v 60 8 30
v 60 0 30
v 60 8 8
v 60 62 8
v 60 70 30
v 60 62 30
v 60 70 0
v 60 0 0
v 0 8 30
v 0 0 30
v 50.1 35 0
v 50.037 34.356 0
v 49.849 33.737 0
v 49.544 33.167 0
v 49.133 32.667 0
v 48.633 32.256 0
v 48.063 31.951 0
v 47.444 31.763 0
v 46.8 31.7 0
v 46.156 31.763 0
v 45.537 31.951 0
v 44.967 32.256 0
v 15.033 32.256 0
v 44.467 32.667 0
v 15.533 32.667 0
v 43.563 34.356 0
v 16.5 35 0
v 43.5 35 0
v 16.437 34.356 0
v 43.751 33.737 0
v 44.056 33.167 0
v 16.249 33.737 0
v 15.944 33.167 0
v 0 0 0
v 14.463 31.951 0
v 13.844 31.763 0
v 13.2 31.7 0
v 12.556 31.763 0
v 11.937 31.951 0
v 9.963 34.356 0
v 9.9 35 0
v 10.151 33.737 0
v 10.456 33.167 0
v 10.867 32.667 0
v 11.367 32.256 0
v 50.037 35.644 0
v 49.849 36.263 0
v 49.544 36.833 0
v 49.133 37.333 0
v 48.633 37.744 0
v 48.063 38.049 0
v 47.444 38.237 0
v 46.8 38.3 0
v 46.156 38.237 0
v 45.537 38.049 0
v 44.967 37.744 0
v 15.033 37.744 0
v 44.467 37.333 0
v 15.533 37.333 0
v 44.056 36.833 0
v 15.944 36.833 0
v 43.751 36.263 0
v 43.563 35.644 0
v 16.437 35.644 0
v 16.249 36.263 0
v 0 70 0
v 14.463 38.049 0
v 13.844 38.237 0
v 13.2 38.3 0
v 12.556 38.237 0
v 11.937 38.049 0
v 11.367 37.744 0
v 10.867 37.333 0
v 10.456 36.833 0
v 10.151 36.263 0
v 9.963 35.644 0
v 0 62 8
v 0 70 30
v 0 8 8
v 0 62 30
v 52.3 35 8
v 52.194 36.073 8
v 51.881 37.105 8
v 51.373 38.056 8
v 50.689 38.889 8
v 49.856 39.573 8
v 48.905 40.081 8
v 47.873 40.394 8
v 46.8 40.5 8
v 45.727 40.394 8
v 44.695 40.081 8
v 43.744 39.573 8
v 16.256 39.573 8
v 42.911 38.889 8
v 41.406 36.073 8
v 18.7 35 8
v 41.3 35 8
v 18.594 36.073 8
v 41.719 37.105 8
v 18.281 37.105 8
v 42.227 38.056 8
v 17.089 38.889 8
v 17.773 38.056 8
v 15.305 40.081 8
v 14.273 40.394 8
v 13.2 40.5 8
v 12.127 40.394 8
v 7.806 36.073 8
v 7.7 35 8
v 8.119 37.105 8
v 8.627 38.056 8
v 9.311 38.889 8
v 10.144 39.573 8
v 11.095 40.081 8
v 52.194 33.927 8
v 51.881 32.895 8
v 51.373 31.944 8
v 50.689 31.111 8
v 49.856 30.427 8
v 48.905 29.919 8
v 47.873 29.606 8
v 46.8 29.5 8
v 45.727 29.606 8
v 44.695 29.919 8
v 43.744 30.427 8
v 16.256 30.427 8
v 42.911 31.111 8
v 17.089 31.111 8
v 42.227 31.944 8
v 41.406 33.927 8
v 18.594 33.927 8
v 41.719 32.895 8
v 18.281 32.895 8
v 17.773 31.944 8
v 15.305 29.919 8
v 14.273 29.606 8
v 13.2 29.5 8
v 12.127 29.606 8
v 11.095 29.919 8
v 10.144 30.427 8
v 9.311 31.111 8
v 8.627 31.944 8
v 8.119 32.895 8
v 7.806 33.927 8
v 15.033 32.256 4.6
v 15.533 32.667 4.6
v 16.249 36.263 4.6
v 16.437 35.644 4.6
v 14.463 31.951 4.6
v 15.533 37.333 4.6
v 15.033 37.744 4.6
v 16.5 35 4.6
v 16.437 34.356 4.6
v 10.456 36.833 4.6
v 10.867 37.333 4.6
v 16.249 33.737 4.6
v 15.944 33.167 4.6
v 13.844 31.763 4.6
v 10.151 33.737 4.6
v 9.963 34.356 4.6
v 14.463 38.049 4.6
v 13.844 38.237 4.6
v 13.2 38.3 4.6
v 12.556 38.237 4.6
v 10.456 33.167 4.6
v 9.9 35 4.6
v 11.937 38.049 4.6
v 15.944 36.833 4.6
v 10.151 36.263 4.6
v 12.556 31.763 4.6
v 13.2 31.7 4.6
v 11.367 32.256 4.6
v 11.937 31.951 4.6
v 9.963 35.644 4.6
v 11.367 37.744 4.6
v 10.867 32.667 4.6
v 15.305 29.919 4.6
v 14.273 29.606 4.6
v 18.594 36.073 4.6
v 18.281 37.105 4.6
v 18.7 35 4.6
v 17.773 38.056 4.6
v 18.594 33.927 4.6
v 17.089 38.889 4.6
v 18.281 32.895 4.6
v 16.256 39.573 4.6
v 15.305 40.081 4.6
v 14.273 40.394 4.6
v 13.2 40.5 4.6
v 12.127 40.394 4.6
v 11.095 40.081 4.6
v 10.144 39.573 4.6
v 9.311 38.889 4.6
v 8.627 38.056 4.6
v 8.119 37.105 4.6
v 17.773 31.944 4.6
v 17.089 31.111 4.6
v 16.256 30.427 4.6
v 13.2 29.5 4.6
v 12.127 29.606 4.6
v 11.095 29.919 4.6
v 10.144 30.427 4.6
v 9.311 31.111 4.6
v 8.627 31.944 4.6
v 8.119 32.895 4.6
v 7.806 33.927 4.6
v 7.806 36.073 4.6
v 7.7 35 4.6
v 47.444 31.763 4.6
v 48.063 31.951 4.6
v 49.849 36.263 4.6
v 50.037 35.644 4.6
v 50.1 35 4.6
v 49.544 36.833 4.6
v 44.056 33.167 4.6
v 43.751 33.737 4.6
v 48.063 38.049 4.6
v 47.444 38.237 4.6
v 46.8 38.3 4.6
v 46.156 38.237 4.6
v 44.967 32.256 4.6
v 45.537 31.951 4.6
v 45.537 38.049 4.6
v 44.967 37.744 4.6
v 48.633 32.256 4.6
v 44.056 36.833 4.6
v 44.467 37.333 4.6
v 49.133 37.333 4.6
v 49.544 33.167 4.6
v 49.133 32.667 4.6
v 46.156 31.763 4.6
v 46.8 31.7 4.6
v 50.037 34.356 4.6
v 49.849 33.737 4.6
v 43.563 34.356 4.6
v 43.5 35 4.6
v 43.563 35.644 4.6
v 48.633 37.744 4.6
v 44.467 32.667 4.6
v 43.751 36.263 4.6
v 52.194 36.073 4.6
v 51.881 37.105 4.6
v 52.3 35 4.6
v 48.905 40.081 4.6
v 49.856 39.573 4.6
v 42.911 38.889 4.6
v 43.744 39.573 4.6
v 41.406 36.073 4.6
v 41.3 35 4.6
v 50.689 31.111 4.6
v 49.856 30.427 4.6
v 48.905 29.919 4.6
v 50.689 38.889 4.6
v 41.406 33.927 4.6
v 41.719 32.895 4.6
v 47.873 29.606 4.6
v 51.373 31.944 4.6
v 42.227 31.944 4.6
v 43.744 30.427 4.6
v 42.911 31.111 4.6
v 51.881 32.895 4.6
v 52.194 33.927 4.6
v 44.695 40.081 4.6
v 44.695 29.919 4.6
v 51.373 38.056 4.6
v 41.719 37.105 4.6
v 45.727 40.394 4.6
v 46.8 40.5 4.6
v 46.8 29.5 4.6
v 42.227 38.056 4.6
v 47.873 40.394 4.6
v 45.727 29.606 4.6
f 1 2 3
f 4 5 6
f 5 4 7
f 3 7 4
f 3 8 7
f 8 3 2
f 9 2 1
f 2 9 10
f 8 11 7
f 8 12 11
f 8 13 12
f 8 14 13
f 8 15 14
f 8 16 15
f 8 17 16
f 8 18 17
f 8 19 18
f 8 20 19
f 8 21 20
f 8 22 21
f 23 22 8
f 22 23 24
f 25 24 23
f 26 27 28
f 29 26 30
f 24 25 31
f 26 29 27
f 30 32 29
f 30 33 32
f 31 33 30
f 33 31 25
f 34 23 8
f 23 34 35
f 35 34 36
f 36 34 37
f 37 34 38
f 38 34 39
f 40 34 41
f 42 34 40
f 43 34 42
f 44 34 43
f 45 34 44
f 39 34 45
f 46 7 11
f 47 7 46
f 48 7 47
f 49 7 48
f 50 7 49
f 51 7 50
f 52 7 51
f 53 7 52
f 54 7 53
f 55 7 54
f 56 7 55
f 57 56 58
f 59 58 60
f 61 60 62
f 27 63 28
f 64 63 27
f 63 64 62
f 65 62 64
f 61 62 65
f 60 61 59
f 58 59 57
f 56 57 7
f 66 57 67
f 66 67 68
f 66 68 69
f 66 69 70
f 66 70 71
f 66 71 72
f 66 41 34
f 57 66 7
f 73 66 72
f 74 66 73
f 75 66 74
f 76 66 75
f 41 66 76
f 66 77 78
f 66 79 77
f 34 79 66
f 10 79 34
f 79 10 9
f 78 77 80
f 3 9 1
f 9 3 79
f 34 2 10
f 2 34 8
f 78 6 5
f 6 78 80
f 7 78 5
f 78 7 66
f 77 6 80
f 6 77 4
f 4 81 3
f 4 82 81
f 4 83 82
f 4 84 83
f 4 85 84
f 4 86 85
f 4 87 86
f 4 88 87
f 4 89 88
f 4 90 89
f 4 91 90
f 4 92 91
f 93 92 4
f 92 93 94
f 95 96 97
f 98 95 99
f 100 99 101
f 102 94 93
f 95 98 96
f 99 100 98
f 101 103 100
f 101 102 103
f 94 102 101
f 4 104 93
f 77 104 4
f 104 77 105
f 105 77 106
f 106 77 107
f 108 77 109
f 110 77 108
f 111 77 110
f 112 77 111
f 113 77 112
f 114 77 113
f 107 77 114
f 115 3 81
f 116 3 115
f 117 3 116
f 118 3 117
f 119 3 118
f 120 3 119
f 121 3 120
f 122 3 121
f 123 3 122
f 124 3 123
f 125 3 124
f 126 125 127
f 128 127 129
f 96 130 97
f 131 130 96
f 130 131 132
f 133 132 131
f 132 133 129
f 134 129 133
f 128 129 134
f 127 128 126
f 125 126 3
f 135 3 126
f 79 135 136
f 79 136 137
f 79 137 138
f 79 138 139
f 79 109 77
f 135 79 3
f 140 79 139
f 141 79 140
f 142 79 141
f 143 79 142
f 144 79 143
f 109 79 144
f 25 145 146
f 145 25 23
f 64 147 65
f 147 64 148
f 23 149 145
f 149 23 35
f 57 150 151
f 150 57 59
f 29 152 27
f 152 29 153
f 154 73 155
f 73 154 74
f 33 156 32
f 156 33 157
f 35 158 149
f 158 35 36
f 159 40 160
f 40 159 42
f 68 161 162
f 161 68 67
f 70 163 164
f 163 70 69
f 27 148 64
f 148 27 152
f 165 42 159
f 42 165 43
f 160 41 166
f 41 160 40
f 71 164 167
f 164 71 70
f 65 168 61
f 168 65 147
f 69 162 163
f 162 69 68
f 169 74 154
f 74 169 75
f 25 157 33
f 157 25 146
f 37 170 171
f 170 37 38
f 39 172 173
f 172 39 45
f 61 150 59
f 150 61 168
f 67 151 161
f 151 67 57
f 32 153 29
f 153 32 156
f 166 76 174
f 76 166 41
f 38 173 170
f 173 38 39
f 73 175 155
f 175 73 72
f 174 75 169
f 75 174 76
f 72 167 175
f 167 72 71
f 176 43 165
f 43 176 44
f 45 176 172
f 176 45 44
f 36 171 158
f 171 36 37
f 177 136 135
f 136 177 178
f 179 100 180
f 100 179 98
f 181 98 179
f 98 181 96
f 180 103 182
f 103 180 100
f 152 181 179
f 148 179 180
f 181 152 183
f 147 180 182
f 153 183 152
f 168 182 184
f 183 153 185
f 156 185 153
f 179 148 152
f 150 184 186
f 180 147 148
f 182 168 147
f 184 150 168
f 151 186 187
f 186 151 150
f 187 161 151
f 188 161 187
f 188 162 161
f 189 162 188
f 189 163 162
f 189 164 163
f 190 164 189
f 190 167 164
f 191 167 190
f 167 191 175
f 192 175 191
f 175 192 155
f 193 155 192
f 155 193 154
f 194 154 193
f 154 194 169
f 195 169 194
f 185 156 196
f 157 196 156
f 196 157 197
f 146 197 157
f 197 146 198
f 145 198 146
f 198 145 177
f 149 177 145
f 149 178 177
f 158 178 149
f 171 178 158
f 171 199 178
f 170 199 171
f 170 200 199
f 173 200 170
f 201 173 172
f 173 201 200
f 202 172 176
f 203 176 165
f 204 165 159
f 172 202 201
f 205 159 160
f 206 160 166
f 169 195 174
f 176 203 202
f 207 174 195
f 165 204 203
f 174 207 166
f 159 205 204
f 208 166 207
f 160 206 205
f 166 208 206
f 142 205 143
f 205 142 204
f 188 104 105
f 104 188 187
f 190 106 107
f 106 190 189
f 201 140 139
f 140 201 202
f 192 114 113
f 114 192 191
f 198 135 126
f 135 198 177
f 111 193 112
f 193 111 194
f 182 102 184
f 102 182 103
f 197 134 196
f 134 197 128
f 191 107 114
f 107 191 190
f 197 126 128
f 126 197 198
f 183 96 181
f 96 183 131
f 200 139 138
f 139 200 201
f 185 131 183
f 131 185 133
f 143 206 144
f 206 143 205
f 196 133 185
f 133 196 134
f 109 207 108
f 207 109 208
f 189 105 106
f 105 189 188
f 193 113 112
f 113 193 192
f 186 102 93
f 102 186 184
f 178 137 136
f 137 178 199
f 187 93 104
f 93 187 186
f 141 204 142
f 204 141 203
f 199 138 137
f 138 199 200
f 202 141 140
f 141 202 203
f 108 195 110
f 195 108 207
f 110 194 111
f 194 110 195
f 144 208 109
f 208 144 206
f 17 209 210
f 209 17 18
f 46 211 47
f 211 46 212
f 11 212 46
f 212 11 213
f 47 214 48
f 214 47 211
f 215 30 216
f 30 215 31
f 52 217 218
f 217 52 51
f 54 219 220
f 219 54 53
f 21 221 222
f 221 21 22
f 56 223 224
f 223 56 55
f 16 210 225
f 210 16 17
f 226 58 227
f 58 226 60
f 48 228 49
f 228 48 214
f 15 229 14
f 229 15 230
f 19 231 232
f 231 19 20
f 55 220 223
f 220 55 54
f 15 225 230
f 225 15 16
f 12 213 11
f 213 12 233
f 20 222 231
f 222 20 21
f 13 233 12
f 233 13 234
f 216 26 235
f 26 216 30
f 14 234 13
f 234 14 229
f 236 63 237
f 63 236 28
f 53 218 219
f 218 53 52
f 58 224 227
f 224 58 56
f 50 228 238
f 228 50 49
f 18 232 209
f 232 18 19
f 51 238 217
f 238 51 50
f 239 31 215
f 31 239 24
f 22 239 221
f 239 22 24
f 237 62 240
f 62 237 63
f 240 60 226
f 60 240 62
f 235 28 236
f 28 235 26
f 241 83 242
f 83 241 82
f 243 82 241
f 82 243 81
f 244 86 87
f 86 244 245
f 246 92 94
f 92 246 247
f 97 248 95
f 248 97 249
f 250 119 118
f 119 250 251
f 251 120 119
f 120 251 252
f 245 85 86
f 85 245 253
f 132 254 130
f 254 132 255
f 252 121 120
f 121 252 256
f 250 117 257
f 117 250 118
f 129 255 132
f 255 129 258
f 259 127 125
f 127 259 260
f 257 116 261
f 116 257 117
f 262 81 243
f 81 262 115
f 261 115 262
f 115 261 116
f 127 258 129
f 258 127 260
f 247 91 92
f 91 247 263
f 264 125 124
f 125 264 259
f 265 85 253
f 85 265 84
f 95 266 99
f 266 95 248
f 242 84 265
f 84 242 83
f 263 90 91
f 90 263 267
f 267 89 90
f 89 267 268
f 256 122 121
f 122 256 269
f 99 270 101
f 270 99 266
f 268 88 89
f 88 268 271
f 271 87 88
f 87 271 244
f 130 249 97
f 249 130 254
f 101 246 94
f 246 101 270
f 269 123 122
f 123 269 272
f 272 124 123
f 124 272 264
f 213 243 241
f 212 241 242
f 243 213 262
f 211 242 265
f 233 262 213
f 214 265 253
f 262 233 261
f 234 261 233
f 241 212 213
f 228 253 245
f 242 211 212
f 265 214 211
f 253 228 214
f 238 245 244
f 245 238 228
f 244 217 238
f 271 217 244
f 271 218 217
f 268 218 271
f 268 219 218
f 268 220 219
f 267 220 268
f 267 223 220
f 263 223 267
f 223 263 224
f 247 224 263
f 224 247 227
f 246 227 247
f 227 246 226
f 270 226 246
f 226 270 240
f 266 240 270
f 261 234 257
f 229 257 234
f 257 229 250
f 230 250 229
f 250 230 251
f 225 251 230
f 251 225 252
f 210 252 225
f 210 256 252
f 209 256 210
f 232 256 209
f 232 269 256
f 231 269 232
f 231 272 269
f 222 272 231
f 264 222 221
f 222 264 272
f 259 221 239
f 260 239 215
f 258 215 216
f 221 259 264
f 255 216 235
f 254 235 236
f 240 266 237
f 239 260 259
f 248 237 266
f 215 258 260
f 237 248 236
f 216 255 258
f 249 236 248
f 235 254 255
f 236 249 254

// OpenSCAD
$fn = 32;

// ----------------------------------------------------------------------
// U-bracket: 60 x 70 x 30 mm
// ----------------------------------------------------------------------

// --- parameters (mm) ---
length = 60;              // outer length, X
width = 70;               // outer width, Y
height = 30;              // upright height, Z
thick = 8;                // wall thickness
hole_d = 6.6;             // clearance for M6
cb_d = 11;                // counterbore diameter
cb_h = 3.4;               // counterbore depth

module hole_z(px, py) {
  translate([px, py, -2.5]) cylinder(h = thick + 5, d = hole_d);
}
module hole_y_pz(pz) {
  /* through both uprights along Y */
  translate([0, -2.5, pz]) rotate([-90, 0, 0]) cylinder(h = width + 5, d = hole_d);
}
module cb_z(px, py) {
  translate([px, py, thick - cb_h]) cylinder(h = cb_h + 0.4, d = cb_d);
}

module base() {
  cube([length, width, thick]);
}

module uprights() {
  cube([length, thick, height]);
  translate([0, width - thick, 0]) cube([length, thick, height]);
}

difference() {
  union() {
    base();
    uprights();
  }
  hole_z(13.2, 35);
  cb_z(13.2, 35);
  hole_z(46.8, 35);
  cb_z(46.8, 35);
}
